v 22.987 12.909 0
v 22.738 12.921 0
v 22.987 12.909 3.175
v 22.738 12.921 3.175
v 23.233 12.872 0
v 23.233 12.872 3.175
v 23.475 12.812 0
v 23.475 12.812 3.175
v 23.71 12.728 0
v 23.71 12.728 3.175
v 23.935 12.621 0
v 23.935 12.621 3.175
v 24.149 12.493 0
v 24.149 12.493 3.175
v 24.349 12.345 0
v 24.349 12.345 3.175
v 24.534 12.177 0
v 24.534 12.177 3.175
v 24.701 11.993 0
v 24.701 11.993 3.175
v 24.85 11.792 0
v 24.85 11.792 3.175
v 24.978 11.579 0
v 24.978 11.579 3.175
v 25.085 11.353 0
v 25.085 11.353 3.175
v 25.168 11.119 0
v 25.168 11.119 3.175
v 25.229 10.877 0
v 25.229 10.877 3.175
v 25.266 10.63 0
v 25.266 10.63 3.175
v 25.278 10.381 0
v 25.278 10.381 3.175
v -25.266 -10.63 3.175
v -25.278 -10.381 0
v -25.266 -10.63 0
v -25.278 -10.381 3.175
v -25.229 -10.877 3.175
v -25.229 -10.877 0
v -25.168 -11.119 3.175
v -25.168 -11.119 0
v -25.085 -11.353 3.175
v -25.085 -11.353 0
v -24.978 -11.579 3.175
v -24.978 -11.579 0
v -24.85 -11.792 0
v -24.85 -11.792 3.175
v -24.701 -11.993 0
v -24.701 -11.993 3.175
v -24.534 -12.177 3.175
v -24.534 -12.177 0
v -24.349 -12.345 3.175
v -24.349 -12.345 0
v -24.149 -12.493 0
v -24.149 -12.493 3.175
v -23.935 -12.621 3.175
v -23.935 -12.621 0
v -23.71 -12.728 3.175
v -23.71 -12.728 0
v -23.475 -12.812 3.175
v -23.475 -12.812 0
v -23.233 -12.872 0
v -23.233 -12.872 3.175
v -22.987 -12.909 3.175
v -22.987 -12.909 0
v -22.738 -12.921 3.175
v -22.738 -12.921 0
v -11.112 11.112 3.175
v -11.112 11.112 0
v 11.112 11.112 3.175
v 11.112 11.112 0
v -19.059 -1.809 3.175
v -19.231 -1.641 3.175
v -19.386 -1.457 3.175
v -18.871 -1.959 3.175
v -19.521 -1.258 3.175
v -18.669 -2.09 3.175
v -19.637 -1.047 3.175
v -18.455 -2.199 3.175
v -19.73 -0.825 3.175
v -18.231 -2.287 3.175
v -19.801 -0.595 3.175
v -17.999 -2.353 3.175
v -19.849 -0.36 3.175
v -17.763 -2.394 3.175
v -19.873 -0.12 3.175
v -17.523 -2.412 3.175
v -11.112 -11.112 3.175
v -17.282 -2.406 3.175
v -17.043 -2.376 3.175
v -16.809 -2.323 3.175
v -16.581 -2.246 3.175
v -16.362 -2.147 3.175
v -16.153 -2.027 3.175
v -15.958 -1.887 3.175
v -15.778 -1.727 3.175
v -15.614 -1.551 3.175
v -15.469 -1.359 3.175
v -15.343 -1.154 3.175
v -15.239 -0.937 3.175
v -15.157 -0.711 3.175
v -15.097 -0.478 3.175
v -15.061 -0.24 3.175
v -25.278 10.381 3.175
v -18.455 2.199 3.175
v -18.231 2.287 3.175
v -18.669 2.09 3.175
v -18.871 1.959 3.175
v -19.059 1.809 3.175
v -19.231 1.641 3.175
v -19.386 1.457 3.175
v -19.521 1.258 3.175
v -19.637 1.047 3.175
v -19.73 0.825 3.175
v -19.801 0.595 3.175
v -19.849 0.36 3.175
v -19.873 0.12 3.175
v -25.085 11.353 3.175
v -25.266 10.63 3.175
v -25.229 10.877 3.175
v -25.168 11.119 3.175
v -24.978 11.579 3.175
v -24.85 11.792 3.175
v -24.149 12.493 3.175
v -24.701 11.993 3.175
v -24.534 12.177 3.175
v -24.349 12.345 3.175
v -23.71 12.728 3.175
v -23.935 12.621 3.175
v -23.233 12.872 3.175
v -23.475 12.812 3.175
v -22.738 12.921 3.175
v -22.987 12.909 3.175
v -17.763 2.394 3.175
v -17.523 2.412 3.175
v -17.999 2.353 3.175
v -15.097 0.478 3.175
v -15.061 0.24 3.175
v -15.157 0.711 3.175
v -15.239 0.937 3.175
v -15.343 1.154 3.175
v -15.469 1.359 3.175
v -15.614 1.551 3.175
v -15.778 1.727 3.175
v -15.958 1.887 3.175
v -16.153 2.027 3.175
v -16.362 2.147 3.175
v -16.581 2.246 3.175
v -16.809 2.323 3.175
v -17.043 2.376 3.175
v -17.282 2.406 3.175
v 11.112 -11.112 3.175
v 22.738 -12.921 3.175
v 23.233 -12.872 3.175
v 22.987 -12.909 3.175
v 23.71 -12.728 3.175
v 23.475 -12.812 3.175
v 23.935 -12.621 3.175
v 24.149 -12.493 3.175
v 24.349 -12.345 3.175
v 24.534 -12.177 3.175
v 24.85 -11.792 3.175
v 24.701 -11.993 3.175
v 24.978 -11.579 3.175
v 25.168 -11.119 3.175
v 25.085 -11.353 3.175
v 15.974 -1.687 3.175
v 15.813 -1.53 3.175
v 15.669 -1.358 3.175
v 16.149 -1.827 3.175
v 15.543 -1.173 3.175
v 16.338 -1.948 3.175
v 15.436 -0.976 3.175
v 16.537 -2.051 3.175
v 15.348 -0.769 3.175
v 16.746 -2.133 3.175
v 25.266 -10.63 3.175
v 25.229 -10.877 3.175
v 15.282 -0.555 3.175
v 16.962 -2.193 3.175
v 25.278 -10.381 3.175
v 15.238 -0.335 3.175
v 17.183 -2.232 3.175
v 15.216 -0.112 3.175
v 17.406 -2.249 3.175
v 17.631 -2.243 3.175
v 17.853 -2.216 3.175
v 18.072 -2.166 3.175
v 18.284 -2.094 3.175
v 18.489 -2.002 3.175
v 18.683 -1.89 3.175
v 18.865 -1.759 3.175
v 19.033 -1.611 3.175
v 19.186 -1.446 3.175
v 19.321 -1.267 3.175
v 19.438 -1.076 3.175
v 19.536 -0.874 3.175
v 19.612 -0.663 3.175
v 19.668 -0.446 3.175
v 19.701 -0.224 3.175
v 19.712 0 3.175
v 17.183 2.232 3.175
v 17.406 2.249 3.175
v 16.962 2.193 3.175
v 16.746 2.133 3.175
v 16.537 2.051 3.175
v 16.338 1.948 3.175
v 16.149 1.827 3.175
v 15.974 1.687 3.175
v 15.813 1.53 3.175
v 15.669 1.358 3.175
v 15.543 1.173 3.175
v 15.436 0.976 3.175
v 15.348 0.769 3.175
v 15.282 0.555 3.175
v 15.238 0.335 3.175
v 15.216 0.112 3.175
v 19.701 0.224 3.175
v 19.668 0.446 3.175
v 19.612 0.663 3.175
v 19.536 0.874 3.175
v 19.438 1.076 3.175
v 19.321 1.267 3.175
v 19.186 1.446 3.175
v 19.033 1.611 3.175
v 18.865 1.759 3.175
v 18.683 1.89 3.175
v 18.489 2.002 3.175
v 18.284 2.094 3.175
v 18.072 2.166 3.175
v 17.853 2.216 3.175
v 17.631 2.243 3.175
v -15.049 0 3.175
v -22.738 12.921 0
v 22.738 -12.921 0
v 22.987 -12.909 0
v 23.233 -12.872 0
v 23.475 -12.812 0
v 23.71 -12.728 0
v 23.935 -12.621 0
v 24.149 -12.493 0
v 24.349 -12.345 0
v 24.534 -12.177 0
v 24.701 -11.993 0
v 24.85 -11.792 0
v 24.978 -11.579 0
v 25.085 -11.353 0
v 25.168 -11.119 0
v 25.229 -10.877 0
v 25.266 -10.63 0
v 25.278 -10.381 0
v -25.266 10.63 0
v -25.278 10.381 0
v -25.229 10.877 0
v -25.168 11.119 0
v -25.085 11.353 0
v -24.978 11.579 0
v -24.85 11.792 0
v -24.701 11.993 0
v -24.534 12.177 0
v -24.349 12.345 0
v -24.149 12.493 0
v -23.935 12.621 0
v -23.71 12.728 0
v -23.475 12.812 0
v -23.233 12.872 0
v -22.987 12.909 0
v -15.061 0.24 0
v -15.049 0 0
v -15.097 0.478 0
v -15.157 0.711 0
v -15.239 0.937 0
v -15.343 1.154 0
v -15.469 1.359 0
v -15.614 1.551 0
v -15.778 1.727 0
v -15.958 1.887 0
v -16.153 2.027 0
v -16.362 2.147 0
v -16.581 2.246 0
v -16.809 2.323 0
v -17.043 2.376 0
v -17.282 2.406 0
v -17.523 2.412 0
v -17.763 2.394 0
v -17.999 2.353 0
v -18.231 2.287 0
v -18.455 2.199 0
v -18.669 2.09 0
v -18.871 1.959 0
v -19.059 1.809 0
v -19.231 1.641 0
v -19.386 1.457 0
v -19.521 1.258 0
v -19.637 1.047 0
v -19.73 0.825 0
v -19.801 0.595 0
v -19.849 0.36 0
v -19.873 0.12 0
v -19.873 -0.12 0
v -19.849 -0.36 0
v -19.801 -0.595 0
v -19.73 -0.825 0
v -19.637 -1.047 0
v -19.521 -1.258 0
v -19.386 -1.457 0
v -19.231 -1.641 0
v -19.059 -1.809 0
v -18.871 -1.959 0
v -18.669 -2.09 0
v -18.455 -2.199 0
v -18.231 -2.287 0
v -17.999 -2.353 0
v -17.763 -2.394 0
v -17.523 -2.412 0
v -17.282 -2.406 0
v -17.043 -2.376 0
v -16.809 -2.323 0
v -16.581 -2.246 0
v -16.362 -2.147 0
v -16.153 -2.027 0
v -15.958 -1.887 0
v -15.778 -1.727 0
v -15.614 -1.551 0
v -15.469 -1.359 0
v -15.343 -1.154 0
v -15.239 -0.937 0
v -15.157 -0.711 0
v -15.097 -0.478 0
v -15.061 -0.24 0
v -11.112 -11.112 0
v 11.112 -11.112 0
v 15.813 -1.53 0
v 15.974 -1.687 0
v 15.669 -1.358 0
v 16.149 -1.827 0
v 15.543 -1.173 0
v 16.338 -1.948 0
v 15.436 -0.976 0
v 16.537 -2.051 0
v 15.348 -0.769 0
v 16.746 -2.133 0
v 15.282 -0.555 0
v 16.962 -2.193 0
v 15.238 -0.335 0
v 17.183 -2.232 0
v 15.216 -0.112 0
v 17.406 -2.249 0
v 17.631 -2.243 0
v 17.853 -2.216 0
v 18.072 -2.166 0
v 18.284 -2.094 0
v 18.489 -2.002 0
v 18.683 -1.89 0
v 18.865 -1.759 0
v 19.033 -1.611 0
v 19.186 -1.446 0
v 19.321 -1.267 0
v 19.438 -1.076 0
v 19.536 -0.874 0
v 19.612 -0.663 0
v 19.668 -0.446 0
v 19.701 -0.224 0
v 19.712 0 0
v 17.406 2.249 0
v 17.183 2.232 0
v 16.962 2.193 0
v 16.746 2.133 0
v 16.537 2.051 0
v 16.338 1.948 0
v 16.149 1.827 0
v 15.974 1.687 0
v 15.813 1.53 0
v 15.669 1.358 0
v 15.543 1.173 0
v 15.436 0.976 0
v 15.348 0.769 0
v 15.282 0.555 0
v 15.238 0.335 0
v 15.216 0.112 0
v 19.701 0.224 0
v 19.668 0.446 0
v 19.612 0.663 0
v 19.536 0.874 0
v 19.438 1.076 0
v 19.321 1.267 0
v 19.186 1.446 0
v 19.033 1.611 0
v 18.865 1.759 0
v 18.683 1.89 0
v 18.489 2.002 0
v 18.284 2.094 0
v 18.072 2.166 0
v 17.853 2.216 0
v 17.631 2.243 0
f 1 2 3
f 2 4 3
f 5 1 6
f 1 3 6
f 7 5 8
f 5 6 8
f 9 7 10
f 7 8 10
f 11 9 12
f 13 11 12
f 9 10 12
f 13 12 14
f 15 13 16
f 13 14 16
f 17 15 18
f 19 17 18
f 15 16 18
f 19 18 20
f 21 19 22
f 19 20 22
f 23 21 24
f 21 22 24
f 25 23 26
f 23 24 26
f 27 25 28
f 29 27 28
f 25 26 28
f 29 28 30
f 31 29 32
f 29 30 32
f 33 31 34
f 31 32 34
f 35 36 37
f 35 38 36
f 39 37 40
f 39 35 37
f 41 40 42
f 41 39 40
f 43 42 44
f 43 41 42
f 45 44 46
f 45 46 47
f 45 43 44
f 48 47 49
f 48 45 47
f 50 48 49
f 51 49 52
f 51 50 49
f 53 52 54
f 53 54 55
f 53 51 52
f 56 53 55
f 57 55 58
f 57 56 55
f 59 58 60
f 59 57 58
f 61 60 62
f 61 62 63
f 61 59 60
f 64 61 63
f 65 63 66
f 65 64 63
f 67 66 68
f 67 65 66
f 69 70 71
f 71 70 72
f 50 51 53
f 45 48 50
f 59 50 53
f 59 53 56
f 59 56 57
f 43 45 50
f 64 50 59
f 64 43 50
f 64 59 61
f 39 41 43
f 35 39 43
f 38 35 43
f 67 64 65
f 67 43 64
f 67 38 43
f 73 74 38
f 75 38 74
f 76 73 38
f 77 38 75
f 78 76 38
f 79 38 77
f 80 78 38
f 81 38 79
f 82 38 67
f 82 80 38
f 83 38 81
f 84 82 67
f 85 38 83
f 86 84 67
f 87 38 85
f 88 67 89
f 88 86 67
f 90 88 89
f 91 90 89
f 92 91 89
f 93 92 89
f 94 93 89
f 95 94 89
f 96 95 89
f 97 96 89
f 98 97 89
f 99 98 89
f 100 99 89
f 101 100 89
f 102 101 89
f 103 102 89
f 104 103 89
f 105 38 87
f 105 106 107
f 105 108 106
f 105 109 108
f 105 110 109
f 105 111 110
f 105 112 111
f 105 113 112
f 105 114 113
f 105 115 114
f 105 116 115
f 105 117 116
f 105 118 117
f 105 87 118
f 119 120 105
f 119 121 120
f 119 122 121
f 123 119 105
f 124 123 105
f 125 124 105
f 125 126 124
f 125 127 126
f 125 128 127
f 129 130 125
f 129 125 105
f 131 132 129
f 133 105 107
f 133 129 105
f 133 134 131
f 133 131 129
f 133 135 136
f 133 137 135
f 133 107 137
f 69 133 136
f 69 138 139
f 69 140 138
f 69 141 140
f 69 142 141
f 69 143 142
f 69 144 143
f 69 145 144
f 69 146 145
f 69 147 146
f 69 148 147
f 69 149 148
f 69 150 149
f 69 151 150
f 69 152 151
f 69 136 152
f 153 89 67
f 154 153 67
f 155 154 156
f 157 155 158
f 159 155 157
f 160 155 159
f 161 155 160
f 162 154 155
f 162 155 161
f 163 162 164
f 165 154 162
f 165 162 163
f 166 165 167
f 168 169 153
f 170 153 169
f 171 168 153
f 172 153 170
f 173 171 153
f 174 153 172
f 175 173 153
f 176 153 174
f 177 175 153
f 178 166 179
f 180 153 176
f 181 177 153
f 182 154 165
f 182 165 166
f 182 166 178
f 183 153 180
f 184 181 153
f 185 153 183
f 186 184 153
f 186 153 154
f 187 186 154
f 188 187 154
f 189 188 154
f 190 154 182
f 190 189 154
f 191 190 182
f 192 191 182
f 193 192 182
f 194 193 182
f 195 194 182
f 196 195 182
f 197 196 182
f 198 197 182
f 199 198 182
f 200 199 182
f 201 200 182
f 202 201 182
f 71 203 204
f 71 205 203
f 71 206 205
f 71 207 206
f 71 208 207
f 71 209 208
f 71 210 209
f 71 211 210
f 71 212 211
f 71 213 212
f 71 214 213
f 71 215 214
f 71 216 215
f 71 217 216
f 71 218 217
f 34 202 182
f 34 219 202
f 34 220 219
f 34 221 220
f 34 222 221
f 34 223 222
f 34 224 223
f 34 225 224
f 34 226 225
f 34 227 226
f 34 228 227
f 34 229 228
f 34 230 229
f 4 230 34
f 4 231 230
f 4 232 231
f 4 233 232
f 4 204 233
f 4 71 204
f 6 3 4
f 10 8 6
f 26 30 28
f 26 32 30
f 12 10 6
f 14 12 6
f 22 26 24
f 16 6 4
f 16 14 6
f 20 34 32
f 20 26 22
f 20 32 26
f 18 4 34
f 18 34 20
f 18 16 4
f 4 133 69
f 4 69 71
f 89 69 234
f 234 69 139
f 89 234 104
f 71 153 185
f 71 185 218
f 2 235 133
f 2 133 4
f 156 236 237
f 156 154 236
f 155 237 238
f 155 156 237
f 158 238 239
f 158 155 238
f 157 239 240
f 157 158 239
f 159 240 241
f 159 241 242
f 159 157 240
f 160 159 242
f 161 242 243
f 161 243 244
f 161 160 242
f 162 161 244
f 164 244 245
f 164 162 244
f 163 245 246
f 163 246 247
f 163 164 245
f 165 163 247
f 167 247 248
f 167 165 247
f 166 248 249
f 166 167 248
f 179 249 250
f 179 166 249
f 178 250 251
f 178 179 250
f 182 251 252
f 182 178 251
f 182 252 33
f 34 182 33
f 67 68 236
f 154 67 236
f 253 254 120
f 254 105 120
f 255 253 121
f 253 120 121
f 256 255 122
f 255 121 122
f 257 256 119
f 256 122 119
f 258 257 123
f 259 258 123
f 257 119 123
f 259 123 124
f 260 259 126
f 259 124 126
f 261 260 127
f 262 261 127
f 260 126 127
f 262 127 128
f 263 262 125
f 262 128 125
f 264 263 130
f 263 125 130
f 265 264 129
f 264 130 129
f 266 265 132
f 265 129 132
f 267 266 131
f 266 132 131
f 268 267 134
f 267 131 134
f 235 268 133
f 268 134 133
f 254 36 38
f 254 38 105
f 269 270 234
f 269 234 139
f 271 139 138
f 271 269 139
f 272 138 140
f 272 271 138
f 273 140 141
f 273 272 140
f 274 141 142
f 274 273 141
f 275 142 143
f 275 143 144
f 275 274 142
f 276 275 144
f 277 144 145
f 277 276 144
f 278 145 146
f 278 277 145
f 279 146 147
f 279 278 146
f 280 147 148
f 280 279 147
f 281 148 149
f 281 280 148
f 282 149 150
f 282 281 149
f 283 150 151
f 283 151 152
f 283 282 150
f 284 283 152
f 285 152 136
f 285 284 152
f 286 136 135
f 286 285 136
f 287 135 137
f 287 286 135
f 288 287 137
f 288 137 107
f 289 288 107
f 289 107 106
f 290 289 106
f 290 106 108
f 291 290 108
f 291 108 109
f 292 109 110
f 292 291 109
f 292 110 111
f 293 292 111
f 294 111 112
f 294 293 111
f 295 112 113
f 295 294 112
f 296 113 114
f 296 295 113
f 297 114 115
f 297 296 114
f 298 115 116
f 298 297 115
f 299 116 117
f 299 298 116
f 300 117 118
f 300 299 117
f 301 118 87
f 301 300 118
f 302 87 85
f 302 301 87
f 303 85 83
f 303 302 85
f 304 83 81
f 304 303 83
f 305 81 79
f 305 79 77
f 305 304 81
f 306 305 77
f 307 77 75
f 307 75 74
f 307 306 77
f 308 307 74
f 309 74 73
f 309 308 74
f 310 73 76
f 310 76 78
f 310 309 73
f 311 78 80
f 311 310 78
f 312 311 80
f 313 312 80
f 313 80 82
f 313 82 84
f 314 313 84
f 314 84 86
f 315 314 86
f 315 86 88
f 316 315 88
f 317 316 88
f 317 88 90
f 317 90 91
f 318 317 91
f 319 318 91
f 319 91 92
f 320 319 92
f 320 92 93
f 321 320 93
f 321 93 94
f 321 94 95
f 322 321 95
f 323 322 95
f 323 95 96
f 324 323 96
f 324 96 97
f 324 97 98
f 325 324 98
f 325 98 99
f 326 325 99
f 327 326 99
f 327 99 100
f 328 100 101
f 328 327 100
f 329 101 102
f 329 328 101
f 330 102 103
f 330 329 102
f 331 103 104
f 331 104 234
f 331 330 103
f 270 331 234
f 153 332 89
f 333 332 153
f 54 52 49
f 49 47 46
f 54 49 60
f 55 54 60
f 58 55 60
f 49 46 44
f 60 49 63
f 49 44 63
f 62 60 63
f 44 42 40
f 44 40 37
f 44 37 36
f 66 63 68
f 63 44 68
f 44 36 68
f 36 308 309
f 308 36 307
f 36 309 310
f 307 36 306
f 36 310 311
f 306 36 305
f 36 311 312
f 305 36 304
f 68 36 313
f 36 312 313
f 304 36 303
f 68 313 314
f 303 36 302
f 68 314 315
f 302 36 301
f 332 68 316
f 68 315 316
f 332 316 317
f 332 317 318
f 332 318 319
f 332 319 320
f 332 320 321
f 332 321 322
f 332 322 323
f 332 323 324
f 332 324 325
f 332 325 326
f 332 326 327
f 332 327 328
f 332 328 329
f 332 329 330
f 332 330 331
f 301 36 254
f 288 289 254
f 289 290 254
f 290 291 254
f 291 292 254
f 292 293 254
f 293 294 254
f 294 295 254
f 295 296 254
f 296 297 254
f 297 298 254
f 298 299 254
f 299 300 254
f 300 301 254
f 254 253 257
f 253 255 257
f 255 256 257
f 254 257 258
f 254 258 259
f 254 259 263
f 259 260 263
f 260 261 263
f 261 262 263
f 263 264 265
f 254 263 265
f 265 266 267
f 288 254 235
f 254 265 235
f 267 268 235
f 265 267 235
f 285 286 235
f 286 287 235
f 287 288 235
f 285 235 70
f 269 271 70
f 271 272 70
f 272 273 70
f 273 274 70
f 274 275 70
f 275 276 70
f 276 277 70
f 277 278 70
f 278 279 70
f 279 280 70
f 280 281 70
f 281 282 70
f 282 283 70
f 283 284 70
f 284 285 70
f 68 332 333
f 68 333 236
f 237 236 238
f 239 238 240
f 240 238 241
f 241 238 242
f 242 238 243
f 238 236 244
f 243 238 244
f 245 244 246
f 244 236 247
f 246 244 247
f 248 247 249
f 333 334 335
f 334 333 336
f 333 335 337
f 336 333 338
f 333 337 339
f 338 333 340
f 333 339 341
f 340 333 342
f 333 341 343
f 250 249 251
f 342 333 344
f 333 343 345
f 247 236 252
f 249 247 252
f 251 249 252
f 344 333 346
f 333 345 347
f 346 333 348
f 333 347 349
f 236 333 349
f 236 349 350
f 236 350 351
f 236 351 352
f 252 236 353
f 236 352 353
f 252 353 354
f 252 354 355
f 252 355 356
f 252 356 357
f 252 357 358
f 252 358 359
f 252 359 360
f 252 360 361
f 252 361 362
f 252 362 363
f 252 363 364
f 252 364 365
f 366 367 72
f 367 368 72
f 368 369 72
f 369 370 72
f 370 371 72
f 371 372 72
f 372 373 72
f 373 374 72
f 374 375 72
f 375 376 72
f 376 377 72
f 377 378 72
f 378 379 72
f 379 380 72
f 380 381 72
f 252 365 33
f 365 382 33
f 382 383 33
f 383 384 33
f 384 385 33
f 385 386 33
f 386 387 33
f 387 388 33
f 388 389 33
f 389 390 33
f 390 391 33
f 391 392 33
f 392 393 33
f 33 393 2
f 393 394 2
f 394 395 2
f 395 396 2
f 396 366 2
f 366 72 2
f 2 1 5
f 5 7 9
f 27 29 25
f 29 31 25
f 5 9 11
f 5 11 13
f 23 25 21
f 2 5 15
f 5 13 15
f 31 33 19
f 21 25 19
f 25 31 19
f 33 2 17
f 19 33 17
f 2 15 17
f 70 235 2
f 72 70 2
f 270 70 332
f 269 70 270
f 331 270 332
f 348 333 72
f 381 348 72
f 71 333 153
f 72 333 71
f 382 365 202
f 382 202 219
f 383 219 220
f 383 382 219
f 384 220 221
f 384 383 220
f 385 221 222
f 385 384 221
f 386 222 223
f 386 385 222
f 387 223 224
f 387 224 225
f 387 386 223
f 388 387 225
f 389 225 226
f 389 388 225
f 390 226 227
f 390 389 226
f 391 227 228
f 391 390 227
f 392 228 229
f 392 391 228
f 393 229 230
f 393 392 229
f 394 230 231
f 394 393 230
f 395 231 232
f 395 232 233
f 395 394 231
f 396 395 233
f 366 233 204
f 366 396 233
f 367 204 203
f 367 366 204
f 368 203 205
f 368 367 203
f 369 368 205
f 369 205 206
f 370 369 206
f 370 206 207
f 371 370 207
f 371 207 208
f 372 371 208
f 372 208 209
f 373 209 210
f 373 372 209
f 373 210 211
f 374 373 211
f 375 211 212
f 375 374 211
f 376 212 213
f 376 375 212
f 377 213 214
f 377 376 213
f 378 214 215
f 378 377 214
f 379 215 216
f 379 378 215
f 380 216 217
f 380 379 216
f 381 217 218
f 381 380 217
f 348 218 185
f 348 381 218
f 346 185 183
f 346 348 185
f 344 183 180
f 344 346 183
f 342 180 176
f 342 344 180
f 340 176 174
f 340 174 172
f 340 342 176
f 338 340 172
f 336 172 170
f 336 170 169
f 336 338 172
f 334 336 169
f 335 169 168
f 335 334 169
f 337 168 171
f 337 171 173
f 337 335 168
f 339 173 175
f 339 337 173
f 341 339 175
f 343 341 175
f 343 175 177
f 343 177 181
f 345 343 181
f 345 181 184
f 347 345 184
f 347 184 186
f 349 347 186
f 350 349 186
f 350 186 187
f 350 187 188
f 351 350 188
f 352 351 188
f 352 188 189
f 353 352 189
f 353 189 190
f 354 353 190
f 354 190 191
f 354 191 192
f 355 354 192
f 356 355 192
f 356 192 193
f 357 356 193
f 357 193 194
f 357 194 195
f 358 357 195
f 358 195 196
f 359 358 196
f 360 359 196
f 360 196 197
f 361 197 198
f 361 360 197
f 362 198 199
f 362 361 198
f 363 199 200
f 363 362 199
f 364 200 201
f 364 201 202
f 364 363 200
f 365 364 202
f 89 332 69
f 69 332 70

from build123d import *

# Parameters (mm, degrees)
SKETCH1_W           = 50.55571166
SKETCH1_H           = 25.842581666
SKETCH1_R           = 2.249766629
SKETCH1_R_2         = 2.413
SKETCH1_W_2         = 22.225
SKETCH1_H_2         = 22.225
BOSS_EXTRUDE1_DEPTH = 3.175
FILLET1_R           = 2.54


with BuildPart() as part:
    # Sketch1 → Boss-Extrude1 (new body)
    with BuildSketch(Plane.XY):
        Rectangle(SKETCH1_W, SKETCH1_H)
        with Locations((17.4625, 0)):
            Circle(SKETCH1_R, mode=Mode.SUBTRACT)
        with Locations((-17.4625, 0)):
            Circle(SKETCH1_R_2, mode=Mode.SUBTRACT)
        Rectangle(SKETCH1_W_2, SKETCH1_H_2, mode=Mode.SUBTRACT)
    extrude(amount=BOSS_EXTRUDE1_DEPTH)

    # Fillet1
    fillet1_edges = [part.edges().sort_by_distance(p)[0] for p in [
        (-25.27785583, -12.921290833, 1.5875),
        (-25.27785583, 12.921290833, 1.5875),
        (25.27785583, 12.921290833, 1.5875),
        (25.27785583, -12.921290833, 1.5875),
    ]]
    fillet(fillet1_edges, radius=FILLET1_R)


solid = part.part
